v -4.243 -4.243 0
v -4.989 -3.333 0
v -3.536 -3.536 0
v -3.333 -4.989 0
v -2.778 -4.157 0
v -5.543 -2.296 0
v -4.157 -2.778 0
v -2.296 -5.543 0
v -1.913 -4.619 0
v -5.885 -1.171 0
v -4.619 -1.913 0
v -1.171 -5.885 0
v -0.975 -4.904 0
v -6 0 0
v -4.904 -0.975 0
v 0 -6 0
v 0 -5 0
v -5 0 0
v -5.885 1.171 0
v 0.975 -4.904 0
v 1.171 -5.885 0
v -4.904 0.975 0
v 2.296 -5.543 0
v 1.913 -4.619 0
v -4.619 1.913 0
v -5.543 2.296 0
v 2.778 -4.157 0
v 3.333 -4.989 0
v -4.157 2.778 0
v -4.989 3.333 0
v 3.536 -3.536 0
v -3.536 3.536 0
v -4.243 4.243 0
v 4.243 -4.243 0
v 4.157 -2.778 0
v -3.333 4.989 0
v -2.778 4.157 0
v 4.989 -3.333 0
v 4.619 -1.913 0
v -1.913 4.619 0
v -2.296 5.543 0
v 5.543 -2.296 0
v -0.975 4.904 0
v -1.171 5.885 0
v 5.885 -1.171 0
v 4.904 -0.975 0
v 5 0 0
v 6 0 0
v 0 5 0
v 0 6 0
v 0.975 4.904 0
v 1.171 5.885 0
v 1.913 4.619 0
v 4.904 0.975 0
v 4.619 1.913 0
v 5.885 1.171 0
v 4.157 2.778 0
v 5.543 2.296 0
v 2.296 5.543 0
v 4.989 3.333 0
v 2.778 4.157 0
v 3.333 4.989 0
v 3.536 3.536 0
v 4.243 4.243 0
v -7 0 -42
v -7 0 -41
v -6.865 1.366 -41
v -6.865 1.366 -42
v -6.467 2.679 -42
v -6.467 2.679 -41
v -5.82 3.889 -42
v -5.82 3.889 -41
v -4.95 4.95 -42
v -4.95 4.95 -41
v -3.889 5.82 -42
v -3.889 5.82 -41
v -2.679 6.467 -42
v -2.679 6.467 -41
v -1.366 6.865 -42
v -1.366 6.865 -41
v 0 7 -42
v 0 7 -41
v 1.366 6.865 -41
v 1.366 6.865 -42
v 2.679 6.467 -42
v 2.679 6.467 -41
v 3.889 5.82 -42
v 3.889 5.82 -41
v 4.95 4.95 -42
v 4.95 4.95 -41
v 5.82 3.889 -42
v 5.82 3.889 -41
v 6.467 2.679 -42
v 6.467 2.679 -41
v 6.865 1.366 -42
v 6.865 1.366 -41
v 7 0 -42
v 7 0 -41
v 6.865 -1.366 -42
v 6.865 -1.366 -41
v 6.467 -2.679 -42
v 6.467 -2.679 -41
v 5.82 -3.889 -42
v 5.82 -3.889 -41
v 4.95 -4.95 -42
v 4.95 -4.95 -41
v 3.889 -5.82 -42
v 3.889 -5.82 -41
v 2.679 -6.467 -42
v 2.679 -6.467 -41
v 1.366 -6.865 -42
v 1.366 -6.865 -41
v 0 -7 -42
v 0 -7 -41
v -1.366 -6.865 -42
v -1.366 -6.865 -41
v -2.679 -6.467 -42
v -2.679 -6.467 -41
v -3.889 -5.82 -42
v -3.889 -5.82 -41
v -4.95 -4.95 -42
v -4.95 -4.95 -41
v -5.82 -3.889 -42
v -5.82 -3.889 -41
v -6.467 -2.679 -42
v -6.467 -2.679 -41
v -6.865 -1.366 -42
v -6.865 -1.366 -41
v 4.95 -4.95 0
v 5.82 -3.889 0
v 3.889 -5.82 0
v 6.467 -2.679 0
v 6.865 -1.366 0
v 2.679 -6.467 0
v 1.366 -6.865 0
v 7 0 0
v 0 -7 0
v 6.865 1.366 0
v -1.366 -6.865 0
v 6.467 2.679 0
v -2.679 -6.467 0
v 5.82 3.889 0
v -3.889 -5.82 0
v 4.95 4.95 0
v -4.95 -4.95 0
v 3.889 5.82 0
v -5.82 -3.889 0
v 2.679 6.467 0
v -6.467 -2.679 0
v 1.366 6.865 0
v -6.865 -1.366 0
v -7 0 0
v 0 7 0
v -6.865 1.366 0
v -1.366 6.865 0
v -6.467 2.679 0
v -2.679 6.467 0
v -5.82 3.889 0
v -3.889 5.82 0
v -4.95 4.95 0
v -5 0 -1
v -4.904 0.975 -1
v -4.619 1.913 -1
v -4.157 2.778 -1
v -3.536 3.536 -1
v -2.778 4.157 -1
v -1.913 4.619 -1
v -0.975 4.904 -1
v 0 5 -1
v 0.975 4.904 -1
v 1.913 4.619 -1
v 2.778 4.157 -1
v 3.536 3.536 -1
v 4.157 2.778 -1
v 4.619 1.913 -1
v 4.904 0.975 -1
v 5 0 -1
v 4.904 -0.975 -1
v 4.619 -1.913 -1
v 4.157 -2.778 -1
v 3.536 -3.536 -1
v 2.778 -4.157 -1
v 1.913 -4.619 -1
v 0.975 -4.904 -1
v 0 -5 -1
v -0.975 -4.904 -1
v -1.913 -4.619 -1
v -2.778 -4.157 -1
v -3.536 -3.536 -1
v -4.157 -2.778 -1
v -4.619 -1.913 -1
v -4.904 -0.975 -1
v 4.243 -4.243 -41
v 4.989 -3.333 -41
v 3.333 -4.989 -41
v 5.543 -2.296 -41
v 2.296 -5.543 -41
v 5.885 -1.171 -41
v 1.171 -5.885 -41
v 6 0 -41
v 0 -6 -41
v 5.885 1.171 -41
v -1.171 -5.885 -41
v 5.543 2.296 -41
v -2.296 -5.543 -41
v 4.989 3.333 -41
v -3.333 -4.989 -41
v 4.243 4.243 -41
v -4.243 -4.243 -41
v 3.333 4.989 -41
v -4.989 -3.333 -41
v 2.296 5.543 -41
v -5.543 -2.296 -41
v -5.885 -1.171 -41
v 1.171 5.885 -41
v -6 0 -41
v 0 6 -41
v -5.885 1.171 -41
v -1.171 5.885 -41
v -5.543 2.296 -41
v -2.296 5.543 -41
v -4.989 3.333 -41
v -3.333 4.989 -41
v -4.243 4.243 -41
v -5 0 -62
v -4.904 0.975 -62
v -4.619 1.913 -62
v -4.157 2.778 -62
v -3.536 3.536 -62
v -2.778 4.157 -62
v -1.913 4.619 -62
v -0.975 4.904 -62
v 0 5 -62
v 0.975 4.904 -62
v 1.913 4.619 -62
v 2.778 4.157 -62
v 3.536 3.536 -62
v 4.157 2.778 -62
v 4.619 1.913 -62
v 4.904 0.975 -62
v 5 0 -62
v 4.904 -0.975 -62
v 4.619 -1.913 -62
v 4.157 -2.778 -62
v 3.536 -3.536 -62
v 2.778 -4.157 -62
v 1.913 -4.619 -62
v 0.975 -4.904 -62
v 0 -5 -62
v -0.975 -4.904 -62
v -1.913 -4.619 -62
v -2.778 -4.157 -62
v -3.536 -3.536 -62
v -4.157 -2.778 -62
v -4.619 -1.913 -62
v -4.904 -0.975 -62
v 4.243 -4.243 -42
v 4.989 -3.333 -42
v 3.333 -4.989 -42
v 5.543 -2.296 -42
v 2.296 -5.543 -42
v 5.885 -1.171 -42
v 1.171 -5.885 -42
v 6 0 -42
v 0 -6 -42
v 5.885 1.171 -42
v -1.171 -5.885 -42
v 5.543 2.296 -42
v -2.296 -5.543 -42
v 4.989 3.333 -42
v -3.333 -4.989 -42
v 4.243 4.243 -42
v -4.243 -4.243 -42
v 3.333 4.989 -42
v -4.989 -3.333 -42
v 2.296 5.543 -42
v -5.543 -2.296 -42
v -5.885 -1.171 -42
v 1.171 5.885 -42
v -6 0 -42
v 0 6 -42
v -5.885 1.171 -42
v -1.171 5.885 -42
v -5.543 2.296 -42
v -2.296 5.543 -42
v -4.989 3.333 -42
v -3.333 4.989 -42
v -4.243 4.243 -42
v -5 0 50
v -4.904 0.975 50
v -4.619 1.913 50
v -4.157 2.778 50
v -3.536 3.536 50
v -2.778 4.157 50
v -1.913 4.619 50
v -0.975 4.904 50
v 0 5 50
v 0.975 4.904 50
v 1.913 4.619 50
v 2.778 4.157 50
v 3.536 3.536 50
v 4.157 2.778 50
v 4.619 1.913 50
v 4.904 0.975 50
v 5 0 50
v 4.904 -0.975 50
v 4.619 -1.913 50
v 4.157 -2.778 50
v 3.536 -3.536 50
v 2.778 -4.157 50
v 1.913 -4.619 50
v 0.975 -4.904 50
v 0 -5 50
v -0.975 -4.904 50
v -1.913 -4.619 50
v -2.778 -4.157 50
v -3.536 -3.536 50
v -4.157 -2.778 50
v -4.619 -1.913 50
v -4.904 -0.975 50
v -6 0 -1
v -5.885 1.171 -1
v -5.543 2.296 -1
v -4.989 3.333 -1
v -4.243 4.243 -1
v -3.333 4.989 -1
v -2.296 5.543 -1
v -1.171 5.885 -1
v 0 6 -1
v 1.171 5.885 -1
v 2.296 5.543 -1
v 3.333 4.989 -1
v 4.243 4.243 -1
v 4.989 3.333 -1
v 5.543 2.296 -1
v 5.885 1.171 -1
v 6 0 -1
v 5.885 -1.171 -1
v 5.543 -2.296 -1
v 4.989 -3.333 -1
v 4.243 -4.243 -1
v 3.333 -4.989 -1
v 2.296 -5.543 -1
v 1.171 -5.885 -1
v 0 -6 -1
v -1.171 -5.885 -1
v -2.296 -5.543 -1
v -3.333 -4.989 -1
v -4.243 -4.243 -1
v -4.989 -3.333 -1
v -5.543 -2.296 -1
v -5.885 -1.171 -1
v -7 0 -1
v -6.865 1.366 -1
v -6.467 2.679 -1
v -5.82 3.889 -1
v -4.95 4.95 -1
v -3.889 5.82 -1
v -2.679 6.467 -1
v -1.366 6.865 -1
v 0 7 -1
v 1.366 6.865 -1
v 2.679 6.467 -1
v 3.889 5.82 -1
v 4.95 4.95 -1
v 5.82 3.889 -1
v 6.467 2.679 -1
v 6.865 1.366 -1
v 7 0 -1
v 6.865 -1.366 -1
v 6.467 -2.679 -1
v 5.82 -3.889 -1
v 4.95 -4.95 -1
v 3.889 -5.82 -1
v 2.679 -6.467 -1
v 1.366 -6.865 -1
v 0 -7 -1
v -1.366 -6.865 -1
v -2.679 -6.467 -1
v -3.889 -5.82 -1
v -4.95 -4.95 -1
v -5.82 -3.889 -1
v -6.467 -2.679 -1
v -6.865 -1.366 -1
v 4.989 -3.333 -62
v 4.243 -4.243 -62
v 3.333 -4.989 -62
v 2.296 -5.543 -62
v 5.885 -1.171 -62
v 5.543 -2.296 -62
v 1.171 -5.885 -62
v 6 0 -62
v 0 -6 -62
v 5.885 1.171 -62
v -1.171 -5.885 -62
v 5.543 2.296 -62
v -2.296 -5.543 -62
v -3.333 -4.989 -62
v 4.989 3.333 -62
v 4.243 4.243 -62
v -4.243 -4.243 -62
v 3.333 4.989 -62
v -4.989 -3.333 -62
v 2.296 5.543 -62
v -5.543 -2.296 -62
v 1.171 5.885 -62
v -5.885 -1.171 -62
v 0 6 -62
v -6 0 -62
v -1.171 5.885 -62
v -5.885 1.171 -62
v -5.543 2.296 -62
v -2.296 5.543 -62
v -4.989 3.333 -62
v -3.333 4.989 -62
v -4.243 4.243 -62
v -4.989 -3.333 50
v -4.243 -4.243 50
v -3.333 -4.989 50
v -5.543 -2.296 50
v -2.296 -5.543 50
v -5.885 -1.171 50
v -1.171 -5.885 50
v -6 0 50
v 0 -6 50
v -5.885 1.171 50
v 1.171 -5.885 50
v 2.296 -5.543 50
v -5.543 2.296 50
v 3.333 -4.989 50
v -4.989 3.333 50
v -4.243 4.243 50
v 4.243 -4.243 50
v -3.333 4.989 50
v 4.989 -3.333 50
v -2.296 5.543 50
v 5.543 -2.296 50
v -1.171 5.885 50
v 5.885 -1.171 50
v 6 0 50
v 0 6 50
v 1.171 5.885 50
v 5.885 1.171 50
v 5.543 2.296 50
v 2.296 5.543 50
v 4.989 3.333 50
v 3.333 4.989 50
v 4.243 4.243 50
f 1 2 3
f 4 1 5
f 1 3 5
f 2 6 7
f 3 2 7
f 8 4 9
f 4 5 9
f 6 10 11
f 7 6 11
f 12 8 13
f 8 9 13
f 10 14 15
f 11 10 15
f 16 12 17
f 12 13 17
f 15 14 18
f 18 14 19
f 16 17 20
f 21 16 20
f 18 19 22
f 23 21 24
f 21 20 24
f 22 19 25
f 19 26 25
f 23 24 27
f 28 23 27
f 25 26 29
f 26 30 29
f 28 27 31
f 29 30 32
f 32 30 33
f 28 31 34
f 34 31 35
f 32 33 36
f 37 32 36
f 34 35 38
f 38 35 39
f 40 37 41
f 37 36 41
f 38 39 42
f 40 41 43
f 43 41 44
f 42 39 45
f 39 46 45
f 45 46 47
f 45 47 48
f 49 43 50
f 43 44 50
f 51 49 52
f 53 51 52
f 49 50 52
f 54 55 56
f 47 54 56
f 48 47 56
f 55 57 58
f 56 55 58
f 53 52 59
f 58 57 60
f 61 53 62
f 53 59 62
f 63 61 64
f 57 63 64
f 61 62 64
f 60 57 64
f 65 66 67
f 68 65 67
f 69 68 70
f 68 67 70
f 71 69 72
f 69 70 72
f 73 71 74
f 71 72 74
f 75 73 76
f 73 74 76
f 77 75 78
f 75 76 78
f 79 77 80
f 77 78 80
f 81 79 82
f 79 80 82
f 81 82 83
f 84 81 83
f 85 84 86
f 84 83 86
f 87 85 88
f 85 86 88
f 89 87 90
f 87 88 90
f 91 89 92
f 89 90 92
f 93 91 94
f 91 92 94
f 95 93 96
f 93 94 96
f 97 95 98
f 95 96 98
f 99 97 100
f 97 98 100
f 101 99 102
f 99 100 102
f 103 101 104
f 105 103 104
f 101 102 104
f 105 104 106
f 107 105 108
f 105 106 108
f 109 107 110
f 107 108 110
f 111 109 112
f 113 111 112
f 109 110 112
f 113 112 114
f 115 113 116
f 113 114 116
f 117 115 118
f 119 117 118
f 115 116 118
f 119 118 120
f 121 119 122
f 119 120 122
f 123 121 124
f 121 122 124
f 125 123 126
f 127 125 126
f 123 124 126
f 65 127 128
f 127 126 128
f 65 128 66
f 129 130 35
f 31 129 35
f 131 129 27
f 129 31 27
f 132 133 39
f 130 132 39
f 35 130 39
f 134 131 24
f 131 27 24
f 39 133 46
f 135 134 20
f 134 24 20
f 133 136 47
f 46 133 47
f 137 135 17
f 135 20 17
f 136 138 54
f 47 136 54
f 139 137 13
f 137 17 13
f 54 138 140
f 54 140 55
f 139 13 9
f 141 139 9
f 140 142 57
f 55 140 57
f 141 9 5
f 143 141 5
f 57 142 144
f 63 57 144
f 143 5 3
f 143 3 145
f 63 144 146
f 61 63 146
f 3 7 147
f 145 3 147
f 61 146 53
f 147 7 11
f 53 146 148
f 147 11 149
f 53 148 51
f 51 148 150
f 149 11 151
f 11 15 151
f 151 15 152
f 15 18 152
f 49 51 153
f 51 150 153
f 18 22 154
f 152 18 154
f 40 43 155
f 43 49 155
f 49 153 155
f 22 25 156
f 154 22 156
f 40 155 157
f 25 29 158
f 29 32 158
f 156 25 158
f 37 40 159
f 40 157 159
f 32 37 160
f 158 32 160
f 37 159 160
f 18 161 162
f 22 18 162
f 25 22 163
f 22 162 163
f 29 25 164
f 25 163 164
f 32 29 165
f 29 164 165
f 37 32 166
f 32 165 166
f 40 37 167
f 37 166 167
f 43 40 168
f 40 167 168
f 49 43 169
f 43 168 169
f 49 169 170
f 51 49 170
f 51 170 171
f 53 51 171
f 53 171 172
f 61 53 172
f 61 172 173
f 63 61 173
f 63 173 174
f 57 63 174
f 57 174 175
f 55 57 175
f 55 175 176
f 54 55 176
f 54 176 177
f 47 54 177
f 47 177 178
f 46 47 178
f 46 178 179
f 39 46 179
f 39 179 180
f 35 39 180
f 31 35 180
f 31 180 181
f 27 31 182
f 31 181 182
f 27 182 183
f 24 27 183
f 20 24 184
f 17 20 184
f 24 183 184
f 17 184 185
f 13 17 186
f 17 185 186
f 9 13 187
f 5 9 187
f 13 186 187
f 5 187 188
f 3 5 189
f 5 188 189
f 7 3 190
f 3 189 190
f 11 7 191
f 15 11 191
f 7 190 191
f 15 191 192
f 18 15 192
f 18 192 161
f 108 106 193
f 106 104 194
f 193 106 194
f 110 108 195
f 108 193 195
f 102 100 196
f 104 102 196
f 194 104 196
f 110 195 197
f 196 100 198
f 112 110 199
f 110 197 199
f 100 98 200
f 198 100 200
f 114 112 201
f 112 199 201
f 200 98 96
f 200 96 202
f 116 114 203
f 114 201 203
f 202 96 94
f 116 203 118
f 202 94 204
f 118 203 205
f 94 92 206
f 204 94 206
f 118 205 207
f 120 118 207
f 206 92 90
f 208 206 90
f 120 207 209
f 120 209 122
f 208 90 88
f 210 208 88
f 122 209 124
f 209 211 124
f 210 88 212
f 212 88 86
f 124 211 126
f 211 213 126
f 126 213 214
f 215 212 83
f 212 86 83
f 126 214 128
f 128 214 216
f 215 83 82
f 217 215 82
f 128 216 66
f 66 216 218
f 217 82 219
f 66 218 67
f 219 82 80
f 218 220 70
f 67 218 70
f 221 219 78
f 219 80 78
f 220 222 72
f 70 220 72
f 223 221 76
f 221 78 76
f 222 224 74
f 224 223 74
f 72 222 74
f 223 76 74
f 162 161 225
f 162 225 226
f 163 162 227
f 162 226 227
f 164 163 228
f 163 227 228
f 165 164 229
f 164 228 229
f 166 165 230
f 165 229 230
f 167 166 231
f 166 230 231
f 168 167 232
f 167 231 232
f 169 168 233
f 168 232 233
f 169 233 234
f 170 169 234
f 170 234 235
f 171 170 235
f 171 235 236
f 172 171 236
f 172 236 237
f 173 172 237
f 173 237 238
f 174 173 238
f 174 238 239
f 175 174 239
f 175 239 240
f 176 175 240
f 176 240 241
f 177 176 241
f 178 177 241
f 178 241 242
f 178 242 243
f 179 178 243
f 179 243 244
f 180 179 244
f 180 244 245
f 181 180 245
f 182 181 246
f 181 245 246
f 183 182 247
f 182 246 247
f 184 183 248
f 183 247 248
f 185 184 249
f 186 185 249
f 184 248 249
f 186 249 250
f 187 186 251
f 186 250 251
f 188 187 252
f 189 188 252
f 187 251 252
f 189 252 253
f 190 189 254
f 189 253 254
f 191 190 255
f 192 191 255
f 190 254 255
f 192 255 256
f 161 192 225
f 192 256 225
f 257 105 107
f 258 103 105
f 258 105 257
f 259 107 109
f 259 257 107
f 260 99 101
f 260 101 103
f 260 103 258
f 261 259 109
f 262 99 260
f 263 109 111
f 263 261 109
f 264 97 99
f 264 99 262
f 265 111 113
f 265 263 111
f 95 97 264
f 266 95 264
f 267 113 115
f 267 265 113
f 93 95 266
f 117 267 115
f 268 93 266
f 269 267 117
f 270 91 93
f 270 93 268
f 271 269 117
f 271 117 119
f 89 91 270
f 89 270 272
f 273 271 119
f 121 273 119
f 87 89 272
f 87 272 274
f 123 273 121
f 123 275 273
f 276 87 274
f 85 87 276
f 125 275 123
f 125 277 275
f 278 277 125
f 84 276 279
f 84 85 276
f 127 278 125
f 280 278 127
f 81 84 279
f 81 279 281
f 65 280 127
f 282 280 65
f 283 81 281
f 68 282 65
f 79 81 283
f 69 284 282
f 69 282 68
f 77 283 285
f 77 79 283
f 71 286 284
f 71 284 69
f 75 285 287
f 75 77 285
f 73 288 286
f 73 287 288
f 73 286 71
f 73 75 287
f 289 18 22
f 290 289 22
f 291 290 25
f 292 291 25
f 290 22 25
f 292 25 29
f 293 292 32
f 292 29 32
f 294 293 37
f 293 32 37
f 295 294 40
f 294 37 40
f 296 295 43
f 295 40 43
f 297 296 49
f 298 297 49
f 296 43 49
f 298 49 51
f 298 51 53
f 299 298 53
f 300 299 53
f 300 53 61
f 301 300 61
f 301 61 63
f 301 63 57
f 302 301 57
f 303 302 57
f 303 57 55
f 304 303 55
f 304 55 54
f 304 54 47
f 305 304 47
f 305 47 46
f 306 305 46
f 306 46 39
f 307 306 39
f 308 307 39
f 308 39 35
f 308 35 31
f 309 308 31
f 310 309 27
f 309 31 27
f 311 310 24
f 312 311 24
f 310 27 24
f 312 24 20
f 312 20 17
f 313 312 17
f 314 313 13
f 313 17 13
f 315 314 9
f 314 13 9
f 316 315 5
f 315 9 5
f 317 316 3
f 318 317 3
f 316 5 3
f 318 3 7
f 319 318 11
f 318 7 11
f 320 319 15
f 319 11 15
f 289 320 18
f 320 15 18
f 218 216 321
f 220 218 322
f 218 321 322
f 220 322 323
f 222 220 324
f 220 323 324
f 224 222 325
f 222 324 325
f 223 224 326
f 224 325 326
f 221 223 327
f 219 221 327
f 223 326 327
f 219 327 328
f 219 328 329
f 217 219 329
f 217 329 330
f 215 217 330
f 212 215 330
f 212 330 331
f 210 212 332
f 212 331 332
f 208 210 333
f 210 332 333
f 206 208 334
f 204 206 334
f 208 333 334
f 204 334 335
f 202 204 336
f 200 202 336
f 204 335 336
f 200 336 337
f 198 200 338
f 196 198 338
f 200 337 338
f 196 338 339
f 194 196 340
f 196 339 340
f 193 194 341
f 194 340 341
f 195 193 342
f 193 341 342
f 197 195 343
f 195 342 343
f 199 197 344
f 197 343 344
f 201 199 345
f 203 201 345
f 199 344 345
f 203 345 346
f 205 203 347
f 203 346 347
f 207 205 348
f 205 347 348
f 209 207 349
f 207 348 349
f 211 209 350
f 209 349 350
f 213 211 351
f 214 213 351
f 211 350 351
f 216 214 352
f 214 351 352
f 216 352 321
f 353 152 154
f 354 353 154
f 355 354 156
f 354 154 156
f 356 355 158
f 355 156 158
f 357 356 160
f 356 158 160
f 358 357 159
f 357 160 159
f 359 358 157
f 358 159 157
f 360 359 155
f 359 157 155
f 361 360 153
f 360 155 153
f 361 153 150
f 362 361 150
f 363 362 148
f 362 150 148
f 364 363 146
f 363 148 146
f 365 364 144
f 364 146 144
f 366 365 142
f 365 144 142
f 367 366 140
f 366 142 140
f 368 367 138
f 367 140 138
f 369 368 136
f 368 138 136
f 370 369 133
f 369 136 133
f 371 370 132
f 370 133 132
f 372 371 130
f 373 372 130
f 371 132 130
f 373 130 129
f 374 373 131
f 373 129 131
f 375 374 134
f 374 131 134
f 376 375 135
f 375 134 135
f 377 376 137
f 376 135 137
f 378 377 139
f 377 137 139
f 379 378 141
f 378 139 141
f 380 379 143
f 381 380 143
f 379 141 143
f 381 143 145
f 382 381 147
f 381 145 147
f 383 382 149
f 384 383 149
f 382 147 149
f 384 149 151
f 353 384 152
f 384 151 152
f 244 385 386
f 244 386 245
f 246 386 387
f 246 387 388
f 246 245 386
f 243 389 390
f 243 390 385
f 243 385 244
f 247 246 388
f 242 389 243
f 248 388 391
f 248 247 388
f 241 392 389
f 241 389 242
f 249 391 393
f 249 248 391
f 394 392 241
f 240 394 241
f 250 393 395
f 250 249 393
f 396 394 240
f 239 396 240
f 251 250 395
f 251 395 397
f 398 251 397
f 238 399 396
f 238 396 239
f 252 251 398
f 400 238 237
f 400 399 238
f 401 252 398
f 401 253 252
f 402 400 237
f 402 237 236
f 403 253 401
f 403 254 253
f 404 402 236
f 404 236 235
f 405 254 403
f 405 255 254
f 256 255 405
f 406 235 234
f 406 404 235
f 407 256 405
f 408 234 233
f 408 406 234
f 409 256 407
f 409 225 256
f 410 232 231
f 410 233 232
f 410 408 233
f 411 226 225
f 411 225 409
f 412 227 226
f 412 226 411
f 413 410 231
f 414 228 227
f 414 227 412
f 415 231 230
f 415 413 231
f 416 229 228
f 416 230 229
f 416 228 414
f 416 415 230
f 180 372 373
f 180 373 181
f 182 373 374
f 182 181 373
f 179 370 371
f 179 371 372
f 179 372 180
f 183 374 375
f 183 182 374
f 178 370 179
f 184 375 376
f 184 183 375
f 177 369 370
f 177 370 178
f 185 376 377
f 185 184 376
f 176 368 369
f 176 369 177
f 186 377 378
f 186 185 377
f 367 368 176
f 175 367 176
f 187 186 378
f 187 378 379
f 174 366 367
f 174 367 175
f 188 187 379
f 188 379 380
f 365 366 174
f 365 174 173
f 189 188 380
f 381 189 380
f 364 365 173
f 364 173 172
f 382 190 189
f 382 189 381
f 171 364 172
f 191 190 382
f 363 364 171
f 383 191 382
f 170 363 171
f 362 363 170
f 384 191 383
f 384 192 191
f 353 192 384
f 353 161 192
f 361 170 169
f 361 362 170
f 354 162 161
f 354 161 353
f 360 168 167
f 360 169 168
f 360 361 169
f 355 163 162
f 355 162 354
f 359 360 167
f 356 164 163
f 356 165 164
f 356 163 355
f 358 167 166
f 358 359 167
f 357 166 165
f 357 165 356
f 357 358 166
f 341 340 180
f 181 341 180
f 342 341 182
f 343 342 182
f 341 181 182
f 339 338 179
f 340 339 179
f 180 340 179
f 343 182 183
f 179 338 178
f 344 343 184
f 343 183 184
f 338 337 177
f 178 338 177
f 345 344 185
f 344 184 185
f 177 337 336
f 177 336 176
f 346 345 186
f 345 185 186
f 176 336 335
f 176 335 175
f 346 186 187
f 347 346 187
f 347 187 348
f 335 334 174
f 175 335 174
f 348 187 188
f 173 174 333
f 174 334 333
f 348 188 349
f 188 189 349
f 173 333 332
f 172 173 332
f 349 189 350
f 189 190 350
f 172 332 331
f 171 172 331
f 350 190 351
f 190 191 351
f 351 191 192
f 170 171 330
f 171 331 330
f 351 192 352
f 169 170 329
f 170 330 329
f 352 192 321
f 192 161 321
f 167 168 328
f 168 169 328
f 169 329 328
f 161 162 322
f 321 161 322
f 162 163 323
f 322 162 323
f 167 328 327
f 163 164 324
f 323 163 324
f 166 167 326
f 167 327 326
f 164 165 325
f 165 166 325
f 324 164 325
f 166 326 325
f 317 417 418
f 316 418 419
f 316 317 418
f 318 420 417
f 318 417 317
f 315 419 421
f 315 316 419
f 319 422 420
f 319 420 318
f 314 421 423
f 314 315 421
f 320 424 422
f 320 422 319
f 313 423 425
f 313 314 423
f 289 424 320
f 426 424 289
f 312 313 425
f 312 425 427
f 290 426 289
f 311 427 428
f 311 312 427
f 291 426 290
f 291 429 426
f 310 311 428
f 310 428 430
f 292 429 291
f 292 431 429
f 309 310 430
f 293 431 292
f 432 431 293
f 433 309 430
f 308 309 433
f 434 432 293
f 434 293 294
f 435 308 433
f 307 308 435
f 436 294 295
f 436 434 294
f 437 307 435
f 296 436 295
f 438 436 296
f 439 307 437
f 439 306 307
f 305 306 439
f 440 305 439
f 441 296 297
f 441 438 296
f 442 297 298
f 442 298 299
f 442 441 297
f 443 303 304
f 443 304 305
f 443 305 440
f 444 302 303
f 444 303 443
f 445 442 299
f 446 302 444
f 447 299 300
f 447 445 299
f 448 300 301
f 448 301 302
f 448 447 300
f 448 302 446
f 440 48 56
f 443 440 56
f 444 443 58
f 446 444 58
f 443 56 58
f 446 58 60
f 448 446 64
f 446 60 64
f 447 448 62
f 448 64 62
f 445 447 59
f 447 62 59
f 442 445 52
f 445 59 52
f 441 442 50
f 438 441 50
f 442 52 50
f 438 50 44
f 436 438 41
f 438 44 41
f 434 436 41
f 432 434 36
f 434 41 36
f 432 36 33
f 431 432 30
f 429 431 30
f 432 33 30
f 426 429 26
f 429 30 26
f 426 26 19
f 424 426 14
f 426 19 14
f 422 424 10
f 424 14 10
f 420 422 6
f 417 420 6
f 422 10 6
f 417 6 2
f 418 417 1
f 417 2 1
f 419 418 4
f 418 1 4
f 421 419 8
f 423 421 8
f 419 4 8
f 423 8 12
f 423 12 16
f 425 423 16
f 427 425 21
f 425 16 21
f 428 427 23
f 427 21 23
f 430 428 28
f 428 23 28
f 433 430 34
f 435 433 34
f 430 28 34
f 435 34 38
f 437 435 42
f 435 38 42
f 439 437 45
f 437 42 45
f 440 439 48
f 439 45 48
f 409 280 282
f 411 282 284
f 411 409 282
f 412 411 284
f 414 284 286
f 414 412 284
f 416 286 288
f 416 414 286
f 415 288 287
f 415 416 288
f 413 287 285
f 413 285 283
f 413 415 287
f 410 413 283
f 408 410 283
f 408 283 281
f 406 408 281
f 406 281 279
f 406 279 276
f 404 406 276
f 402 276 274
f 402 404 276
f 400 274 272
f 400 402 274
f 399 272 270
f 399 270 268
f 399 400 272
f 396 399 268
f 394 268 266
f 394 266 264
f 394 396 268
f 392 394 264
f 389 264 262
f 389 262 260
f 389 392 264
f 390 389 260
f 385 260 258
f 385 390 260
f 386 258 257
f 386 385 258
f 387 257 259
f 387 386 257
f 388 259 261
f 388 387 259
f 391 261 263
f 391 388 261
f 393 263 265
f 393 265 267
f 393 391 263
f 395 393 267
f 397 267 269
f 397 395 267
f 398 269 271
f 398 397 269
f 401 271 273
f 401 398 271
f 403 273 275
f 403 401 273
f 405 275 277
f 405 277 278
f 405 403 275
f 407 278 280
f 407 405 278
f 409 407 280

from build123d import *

# Parameters (mm, degrees)
SKETCH1_R           = 6
BOSS_EXTRUDE1_DEPTH = 50
SKETCH2_R           = 7
BOSS_EXTRUDE2_DEPTH = 1
SKETCH3_R           = 6
BOSS_EXTRUDE3_DEPTH = 40
SKETCH4_R           = 7
BOSS_EXTRUDE4_DEPTH = 1
BOSS_EXTRUDE5_START = 20
SKETCH5_R           = 6
BOSS_EXTRUDE5_DEPTH = 20
SKETCH6_R           = 5
CUT_EXTRUDE1_DEPTH  = 200


with BuildPart() as part:
    # Sketch1 → Boss-Extrude1 (new body)
    with BuildSketch(Plane.XY):
        Circle(SKETCH1_R)
    extrude(amount=BOSS_EXTRUDE1_DEPTH)


with BuildPart() as body_2:
    # Sketch2 → Boss-Extrude2 (new body)
    with BuildSketch(Plane(origin=(0, 0, 0), x_dir=(-1, 0, 0), z_dir=(0, 0, -1))):
        Circle(SKETCH2_R)
    extrude(amount=BOSS_EXTRUDE2_DEPTH)


with BuildPart() as body_3:
    # Sketch3 → Boss-Extrude3 (new body)
    with BuildSketch(Plane(origin=(0, 0, -1), x_dir=(-1, 0, 0), z_dir=(0, 0, -1))):
        Circle(SKETCH3_R)
    extrude(amount=BOSS_EXTRUDE3_DEPTH)

    # Sketch4 → Boss-Extrude4 (add)
    with BuildSketch(Plane(origin=(0, 0, -41), x_dir=(-1, 0, 0), z_dir=(0, 0, -1))):
        Circle(SKETCH4_R)
    extrude(amount=BOSS_EXTRUDE4_DEPTH)

    # Sketch5 → Boss-Extrude5 (add)
    with BuildSketch(Plane(origin=(0, 0, -42), x_dir=(-1, 0, 0), z_dir=(0, 0, -1)).offset(BOSS_EXTRUDE5_START)):
        Circle(SKETCH5_R)
    extrude(amount=-BOSS_EXTRUDE5_DEPTH)


with BuildPart() as cut_extrude1_tool:
    # Sketch6 → Cut-Extrude1 (new body)
    with BuildSketch(Plane(origin=(0, 0, -62), x_dir=(-1, 0, 0), z_dir=(0, 0, -1))):
        Circle(SKETCH6_R)
    extrude(amount=-CUT_EXTRUDE1_DEPTH)


with BuildPart() as part_1:
    add(part.part)

    # Cut-Extrude1: cut by cut_extrude1_tool
    add(cut_extrude1_tool.part, mode=Mode.SUBTRACT)


with BuildPart() as body_2_1:
    add(body_2.part)

    # Cut-Extrude1: cut by cut_extrude1_tool
    add(cut_extrude1_tool.part, mode=Mode.SUBTRACT)


with BuildPart() as body_3_1:
    add(body_3.part)

    # Cut-Extrude1: cut by cut_extrude1_tool
    add(cut_extrude1_tool.part, mode=Mode.SUBTRACT)


solid = Compound([part_1.part, body_2_1.part, body_3_1.part])
